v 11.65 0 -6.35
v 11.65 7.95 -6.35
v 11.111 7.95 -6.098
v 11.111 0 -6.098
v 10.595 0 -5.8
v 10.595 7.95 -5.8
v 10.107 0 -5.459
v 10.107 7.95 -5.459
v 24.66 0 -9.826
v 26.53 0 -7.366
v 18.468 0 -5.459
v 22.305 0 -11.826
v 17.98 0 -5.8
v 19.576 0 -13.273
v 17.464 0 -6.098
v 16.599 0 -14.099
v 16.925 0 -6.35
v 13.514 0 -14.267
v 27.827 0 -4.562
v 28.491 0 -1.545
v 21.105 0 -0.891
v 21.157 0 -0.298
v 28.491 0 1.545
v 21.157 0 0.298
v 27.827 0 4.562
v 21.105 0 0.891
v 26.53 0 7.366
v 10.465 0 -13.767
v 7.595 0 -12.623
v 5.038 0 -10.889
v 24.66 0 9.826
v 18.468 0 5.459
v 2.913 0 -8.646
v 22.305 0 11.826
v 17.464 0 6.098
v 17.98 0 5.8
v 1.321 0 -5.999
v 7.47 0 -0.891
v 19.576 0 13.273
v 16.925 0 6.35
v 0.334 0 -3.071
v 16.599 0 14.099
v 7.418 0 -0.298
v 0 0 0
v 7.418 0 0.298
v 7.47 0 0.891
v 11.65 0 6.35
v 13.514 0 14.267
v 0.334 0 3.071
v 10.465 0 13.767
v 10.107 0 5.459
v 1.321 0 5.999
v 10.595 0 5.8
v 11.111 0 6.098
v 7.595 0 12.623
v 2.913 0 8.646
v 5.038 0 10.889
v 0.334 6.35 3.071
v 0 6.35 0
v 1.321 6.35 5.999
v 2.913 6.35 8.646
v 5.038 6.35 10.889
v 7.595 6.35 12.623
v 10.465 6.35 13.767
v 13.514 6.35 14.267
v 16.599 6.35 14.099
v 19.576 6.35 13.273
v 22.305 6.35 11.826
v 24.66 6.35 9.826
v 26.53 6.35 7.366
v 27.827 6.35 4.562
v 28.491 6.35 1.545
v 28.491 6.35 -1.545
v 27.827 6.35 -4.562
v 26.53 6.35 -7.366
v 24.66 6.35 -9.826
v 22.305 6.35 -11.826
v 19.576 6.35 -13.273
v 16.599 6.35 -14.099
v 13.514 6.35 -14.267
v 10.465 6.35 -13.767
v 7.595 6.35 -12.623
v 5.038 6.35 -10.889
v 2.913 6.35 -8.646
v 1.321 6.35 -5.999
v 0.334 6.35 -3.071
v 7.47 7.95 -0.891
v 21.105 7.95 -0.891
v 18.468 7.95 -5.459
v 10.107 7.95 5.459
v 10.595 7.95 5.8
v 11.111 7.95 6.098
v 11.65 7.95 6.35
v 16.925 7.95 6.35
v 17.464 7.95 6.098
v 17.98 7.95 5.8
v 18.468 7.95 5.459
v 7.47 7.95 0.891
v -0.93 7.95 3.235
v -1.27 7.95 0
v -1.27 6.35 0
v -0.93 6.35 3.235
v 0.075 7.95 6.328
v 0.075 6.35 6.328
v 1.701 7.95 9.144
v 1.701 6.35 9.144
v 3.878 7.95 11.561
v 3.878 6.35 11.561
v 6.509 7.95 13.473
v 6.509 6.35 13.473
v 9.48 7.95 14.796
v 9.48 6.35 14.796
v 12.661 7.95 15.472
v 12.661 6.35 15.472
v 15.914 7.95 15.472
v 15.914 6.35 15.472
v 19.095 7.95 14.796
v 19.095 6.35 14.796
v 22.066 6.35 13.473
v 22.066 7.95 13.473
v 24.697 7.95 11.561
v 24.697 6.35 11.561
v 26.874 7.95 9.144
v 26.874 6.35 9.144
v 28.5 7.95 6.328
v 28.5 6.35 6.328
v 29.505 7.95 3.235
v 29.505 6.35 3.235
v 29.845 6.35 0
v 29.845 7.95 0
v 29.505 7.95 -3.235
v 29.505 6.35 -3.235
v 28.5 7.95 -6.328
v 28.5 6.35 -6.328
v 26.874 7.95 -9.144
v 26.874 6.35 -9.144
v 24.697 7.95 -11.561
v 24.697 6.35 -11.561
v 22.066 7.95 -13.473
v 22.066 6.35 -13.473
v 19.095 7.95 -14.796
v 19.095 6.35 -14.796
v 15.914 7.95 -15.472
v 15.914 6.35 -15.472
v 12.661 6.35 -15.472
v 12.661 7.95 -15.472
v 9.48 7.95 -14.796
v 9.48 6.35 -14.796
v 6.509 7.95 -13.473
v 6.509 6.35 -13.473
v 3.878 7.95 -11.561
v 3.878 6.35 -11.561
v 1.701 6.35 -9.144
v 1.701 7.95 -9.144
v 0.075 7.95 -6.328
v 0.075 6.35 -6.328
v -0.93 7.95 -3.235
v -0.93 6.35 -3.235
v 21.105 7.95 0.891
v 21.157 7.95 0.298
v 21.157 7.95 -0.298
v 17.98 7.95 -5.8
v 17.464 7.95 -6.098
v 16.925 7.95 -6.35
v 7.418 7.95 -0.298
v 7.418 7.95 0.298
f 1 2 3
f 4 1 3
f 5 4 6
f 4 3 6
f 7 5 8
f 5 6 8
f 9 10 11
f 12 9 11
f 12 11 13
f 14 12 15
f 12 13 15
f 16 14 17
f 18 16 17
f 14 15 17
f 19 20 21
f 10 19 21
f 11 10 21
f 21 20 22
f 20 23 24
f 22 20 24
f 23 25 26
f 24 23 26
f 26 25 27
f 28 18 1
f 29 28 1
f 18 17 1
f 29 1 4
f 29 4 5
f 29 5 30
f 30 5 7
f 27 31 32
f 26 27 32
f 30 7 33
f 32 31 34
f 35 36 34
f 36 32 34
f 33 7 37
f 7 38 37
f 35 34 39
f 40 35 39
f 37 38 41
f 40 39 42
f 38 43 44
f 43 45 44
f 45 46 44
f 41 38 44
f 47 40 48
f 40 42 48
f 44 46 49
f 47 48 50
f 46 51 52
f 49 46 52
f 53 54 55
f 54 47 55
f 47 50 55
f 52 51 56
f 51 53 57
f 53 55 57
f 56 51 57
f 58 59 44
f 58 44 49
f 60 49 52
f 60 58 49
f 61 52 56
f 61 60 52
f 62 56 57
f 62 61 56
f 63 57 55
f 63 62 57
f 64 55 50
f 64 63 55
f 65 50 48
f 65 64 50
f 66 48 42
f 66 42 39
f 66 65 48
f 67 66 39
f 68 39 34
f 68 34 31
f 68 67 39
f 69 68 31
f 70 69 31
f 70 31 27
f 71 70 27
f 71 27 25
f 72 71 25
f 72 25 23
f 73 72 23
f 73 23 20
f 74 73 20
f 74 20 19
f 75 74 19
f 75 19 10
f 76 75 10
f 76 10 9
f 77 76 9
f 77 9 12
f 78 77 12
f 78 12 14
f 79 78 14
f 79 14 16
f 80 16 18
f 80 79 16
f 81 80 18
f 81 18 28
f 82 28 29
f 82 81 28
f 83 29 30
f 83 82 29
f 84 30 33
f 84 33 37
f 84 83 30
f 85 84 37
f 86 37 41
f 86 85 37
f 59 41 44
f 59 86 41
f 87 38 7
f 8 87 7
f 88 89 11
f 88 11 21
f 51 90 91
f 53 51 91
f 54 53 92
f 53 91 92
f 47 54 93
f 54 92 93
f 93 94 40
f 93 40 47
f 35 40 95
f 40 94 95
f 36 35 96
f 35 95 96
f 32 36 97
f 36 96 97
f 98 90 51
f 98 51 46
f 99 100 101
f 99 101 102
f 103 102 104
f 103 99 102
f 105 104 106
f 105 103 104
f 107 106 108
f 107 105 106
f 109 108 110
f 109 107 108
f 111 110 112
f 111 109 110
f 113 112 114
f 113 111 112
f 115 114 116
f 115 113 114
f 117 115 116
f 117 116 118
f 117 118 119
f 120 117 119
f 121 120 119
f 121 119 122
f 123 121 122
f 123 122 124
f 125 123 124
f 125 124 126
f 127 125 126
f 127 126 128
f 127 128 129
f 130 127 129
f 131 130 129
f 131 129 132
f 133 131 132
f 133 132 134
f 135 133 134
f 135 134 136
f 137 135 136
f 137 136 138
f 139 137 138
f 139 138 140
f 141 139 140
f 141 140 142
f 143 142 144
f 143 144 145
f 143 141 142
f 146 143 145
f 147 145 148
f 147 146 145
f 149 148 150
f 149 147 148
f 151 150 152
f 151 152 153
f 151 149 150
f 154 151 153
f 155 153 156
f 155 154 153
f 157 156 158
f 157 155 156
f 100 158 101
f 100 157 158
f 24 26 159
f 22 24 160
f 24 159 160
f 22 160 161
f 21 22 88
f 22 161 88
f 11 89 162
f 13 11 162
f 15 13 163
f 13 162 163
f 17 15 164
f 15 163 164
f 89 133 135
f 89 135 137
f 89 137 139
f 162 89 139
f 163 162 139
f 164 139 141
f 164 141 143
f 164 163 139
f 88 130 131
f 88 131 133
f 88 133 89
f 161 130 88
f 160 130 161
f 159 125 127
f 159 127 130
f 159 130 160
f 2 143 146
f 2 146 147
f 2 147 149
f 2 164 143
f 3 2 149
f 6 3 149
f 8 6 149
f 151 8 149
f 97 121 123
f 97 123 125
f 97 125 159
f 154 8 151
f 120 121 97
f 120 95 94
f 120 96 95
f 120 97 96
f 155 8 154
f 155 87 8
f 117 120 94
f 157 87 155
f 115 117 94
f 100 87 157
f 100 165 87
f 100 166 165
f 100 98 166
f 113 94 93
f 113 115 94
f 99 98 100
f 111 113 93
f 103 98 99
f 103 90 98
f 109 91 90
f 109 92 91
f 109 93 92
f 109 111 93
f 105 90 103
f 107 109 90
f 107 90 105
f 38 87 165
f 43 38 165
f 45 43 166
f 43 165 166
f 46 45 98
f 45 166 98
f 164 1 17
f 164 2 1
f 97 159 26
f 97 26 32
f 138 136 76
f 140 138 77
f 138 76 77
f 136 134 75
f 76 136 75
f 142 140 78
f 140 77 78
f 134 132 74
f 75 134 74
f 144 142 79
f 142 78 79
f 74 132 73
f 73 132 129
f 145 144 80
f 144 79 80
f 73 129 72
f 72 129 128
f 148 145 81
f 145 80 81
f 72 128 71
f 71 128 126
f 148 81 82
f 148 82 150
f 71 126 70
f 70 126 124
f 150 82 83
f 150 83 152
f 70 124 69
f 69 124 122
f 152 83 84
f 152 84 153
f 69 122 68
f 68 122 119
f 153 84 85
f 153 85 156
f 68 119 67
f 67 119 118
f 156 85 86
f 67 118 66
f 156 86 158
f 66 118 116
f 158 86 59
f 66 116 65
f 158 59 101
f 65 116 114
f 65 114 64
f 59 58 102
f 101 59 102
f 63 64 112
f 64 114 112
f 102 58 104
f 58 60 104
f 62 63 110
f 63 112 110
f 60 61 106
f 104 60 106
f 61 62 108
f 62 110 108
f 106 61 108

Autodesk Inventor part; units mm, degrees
ref_plane "YZ Plane" through (0, 0, 0) normal (1, 0, 0) x (0, 1, 0)
ref_plane "XZ Plane" through (0, 0, 0) normal (0, 1, 0) x (-1, 0, 0)
ref_plane "XY Plane" through (0, 0, 0) normal (0, 0, 1) x (1, 0, 0)
sketch "Sketch5" plane through (0, 0, 0) normal (0, 0, 1) x (1, 0, 0)
  line L0 (0, 0) -> (0, 6.35)
  line L1 (0, 6.35) -> (-1.27, 6.35)
  line L2 (-1.27, 6.35) -> (-1.27, 7.9502)
  line L3 (-1.27, 7.9502) -> (29.845, 7.9502)
  line L4 (29.845, 7.9502) -> (29.845, 6.35)
  line L5 (29.845, 6.35) -> (28.575, 6.35)
  line L6 (28.575, 6.35) -> (28.575, 0)
  line L7 (28.575, 0) -> (0, 0)
  line L8 (14.2875, 0) -> (14.2875, 7.9502)
  dimension "d8" = 28.575
  dimension "d9" = 31.115
  dimension "d10" = 6.35
  dimension "d12" = 7.9502
revolve "Revolution2" add sketch "Sketch5" angle 360 about axis through (14.2875, 0, 0) along (0, 1, 0) contours L0 L1 L2 L3 L8 L7
sketch "Sketch6" plane through (14.2875, 7.9502, 0) normal (0, 1, 0) x (1, 0, 0)
  line L0 (-7.3323, 0) -> (-3.6662, 6.35)
  line L1 (-3.6662, 6.35) -> (3.6662, 6.35)
  line L2 (3.6662, 6.35) -> (7.3323, 0)
  line L3 (7.3323, 0) -> (3.6662, -6.35)
  line L4 (3.6662, -6.35) -> (-3.6662, -6.35)
  line L5 (-3.6662, -6.35) -> (-7.3323, 0)
  circle A0 centre (0, 0) radius 15.5575 projected
  circle A1 centre (0, 0) radius 6.8758
  point P0 (-14.2875, 0)
  point P1 (2.637, -6.35)
  point P2 (4.1808, -5.4587)
  point P3 (6.8178, -0.8913)
  point P4 (6.8178, 0.8913)
  point P5 (4.1808, 5.4587)
  point P6 (2.637, 6.35)
  point P7 (-2.637, 6.35)
  point P8 (-4.1808, 5.4587)
  point P9 (-6.8178, 0.8913)
  point P10 (-6.8178, -0.8913)
  point P11 (-4.1808, -5.4587)
  point P12 (-2.637, -6.35)
  dimension "d14" = 12.7
  dimension "d15" = 13.7516
extrude "Extrusion1" cut sketch "Sketch6" against normal through all contours L0 A1 L1 L2 L3 L4 L5
properties part number "part_ Ball Bearing for Thundershaft"
